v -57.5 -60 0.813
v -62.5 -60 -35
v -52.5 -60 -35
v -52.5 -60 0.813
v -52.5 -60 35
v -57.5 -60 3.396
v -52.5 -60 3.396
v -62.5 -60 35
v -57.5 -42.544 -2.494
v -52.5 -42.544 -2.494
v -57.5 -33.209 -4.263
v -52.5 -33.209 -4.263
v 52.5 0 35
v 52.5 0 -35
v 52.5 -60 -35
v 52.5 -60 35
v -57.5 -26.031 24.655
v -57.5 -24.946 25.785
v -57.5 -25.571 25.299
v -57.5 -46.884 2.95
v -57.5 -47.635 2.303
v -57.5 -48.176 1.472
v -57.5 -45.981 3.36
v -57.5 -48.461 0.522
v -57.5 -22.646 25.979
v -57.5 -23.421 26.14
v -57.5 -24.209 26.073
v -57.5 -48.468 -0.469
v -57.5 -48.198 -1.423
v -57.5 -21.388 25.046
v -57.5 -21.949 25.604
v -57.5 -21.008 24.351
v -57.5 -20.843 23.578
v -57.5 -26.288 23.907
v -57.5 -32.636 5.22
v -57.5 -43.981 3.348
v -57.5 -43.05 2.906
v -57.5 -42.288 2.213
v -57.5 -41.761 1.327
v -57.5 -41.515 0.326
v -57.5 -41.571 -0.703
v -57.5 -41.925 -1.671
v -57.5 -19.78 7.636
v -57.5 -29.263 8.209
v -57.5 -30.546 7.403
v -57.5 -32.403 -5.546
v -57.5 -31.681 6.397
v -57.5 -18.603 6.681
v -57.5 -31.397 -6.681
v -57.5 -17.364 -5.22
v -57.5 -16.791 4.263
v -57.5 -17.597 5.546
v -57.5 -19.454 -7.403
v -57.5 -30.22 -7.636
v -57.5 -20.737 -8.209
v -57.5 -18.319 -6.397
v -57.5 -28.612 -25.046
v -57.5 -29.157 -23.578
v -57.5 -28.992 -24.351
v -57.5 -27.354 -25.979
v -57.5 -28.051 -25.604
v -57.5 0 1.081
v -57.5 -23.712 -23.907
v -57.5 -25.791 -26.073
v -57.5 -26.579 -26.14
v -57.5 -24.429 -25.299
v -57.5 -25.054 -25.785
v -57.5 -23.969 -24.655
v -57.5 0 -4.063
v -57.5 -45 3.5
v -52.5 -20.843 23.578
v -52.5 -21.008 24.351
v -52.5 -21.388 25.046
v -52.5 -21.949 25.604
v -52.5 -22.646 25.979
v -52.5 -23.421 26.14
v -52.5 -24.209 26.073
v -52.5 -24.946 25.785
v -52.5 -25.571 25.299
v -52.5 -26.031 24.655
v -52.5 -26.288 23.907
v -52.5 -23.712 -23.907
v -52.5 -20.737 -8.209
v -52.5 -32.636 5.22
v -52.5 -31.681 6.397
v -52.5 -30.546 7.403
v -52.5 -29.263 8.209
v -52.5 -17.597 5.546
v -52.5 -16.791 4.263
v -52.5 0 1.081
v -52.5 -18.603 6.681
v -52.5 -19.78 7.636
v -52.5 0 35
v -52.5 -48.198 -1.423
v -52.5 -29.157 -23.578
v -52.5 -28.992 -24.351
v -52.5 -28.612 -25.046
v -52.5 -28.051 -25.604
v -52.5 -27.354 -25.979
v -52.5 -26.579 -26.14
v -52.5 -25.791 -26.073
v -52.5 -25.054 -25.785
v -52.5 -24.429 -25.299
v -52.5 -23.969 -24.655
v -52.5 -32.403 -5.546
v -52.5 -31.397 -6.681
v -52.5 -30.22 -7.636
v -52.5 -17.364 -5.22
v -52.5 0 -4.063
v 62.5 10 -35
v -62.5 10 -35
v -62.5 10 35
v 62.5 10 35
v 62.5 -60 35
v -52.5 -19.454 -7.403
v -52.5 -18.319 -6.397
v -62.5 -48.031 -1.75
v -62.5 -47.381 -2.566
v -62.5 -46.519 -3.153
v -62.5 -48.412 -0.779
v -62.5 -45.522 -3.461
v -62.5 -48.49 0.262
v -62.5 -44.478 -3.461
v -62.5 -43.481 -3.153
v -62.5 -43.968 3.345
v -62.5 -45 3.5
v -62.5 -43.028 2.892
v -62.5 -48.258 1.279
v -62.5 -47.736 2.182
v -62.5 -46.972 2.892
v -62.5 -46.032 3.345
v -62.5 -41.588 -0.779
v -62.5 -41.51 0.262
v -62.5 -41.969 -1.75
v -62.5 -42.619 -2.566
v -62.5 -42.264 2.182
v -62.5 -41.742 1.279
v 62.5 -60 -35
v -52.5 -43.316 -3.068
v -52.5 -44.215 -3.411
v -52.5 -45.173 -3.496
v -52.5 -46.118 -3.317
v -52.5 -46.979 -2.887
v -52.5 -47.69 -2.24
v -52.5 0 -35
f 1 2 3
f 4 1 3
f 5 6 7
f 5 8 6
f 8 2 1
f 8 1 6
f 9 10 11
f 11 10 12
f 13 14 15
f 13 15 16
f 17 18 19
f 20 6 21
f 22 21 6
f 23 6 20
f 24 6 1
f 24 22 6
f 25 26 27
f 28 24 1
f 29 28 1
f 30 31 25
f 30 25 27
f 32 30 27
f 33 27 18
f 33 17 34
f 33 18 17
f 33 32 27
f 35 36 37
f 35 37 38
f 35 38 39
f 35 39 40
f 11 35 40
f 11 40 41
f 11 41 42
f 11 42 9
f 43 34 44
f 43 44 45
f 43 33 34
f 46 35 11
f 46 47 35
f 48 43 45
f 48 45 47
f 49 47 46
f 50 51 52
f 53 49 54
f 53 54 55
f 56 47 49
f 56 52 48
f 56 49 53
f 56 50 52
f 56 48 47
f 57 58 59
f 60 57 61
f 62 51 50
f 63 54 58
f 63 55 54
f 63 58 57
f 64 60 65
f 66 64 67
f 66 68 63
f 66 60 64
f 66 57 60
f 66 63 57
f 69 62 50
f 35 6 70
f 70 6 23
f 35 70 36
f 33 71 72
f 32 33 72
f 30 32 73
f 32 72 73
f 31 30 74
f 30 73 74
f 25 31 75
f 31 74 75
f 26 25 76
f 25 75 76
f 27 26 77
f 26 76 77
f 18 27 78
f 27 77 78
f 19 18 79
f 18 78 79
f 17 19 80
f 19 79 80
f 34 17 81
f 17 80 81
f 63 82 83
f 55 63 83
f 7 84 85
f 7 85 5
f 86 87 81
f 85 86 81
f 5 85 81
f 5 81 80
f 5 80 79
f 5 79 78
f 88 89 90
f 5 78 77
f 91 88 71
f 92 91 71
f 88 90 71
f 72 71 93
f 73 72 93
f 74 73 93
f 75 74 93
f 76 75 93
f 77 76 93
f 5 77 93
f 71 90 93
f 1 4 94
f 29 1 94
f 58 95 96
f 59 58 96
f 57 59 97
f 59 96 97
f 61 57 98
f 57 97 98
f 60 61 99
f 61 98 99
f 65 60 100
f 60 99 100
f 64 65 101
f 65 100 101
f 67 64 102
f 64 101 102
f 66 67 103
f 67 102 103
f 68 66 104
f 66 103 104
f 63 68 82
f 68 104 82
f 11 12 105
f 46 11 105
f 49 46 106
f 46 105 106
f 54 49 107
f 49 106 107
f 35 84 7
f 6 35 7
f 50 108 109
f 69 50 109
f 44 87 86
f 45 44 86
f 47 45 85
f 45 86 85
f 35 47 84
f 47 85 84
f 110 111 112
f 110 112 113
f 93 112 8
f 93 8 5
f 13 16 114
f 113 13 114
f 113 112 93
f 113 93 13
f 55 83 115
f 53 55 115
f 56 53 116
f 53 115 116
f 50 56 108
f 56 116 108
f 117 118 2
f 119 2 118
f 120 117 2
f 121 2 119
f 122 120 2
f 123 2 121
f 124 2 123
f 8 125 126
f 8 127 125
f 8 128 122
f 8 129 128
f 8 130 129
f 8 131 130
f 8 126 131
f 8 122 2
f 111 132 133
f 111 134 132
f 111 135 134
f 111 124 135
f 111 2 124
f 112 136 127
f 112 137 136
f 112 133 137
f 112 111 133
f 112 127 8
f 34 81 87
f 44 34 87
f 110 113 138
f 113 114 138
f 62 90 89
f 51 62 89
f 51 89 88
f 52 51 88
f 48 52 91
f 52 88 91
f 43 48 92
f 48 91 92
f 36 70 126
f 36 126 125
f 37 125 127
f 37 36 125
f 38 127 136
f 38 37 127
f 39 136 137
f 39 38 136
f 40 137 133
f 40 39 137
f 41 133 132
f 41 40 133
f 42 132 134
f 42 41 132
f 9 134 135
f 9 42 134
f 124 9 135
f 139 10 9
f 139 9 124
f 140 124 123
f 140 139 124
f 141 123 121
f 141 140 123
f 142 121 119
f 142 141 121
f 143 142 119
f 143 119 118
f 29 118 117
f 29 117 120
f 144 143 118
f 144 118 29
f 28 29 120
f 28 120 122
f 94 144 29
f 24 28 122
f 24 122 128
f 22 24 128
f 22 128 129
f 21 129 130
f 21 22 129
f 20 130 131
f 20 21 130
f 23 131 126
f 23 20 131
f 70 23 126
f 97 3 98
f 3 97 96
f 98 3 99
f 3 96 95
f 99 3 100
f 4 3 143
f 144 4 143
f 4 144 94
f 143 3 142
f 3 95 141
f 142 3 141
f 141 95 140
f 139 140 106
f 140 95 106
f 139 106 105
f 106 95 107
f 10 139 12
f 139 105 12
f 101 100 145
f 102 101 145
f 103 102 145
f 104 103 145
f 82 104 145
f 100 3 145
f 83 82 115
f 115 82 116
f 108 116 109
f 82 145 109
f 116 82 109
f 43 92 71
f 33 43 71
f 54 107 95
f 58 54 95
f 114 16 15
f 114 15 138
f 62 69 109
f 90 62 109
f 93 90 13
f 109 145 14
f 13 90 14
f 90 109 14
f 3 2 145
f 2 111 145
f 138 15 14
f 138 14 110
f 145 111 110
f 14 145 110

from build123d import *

# Parameters (mm, degrees)
SKETCH2_W           = 125
SKETCH2_H           = 70
BOSS_EXTRUDE1_DEPTH = 10
SKETCH3_W           = 10
SKETCH3_H           = 70
BOSS_EXTRUDE2_DEPTH = 60
CUT_EXTRUDE1_DEPTH  = 5
CUT_EXTRUDE2_START  = -15
SKETCH6_R           = 3.5
CUT_EXTRUDE2_DEPTH  = 15


with BuildPart() as part:
    # Sketch2 → Boss-Extrude1 (new body)
    with BuildSketch(Plane(origin=(0, 0, 0), x_dir=(1, 0, 0), z_dir=(0, 1, 0))):
        Rectangle(SKETCH2_W, SKETCH2_H)
    extrude(amount=BOSS_EXTRUDE1_DEPTH)

    # Sketch3 → Boss-Extrude2 (add)
    with BuildSketch(Plane.XZ):
        with Locations((-57.5, 0)):
            Rectangle(SKETCH3_W, SKETCH3_H)
        with Locations((57.5, 0)):
            Rectangle(SKETCH3_W, SKETCH3_H)
    extrude(amount=BOSS_EXTRUDE2_DEPTH)

    # Sketch4 → Cut-Extrude1 (cut)
    with BuildSketch(Plane(origin=(-52.5, 0, 0), x_dir=(0, 0, -1), z_dir=(1, 0, 0))):
        with BuildLine():
            Line((-3.395932152, -60), (-0.813446687, -60))
            Line((-0.813446687, -60), (1.422755234, -48.197775406))
            ThreePointArc((1.422755234, -48.197775406), (-3.43881752, -44.348437214), (2.493929957, -42.544330362))
            Line((2.493929957, -42.544330362), (4.2626708, -33.209271445))
            ThreePointArc((4.2626708, -33.209271445), (6.134370688, -31.923293743), (7.636341499, -30.220037214))
            Line((7.636341499, -30.220037214), (23.57750665, -29.157373753))
            ThreePointArc((23.57750665, -29.157373753), (26.139587656, -26.579311787), (23.90653542, -23.711535594))
            Line((23.90653542, -23.711535594), (8.209271445, -20.7373292))
            ThreePointArc((8.209271445, -20.7373292), (6.923293743, -18.865629312), (5.220037214, -17.363658501))
            Line((5.220037214, -17.363658501), (4.062548081, 0))
            Line((4.062548081, 0), (-1.081282483, 0))
            Line((-1.081282483, 0), (-4.2626708, -16.790728555))
            ThreePointArc((-4.2626708, -16.790728555), (-6.134370688, -18.076706257), (-7.636341499, -19.779962786))
            Line((-7.636341499, -19.779962786), (-23.57750665, -20.842626247))
            ThreePointArc((-23.57750665, -20.842626247), (-26.139587656, -23.420688213), (-23.90653542, -26.288464406))
            Line((-23.90653542, -26.288464406), (-8.209271445, -29.2626708))
            ThreePointArc((-8.209271445, -29.2626708), (-6.923293743, -31.134370688), (-5.220037214, -32.636341499))
            Line((-5.220037214, -32.636341499), (-3.395932152, -60))
        make_face()
    extrude(amount=-CUT_EXTRUDE1_DEPTH, mode=Mode.SUBTRACT)

    # Sketch6 → Cut-Extrude2 (cut)
    with BuildSketch(Plane.ZY.offset(62.5).offset(CUT_EXTRUDE2_START)):
        with Locations((0, -45)):
            Circle(SKETCH6_R)
    extrude(amount=CUT_EXTRUDE2_DEPTH, mode=Mode.SUBTRACT)


solid = part.part
